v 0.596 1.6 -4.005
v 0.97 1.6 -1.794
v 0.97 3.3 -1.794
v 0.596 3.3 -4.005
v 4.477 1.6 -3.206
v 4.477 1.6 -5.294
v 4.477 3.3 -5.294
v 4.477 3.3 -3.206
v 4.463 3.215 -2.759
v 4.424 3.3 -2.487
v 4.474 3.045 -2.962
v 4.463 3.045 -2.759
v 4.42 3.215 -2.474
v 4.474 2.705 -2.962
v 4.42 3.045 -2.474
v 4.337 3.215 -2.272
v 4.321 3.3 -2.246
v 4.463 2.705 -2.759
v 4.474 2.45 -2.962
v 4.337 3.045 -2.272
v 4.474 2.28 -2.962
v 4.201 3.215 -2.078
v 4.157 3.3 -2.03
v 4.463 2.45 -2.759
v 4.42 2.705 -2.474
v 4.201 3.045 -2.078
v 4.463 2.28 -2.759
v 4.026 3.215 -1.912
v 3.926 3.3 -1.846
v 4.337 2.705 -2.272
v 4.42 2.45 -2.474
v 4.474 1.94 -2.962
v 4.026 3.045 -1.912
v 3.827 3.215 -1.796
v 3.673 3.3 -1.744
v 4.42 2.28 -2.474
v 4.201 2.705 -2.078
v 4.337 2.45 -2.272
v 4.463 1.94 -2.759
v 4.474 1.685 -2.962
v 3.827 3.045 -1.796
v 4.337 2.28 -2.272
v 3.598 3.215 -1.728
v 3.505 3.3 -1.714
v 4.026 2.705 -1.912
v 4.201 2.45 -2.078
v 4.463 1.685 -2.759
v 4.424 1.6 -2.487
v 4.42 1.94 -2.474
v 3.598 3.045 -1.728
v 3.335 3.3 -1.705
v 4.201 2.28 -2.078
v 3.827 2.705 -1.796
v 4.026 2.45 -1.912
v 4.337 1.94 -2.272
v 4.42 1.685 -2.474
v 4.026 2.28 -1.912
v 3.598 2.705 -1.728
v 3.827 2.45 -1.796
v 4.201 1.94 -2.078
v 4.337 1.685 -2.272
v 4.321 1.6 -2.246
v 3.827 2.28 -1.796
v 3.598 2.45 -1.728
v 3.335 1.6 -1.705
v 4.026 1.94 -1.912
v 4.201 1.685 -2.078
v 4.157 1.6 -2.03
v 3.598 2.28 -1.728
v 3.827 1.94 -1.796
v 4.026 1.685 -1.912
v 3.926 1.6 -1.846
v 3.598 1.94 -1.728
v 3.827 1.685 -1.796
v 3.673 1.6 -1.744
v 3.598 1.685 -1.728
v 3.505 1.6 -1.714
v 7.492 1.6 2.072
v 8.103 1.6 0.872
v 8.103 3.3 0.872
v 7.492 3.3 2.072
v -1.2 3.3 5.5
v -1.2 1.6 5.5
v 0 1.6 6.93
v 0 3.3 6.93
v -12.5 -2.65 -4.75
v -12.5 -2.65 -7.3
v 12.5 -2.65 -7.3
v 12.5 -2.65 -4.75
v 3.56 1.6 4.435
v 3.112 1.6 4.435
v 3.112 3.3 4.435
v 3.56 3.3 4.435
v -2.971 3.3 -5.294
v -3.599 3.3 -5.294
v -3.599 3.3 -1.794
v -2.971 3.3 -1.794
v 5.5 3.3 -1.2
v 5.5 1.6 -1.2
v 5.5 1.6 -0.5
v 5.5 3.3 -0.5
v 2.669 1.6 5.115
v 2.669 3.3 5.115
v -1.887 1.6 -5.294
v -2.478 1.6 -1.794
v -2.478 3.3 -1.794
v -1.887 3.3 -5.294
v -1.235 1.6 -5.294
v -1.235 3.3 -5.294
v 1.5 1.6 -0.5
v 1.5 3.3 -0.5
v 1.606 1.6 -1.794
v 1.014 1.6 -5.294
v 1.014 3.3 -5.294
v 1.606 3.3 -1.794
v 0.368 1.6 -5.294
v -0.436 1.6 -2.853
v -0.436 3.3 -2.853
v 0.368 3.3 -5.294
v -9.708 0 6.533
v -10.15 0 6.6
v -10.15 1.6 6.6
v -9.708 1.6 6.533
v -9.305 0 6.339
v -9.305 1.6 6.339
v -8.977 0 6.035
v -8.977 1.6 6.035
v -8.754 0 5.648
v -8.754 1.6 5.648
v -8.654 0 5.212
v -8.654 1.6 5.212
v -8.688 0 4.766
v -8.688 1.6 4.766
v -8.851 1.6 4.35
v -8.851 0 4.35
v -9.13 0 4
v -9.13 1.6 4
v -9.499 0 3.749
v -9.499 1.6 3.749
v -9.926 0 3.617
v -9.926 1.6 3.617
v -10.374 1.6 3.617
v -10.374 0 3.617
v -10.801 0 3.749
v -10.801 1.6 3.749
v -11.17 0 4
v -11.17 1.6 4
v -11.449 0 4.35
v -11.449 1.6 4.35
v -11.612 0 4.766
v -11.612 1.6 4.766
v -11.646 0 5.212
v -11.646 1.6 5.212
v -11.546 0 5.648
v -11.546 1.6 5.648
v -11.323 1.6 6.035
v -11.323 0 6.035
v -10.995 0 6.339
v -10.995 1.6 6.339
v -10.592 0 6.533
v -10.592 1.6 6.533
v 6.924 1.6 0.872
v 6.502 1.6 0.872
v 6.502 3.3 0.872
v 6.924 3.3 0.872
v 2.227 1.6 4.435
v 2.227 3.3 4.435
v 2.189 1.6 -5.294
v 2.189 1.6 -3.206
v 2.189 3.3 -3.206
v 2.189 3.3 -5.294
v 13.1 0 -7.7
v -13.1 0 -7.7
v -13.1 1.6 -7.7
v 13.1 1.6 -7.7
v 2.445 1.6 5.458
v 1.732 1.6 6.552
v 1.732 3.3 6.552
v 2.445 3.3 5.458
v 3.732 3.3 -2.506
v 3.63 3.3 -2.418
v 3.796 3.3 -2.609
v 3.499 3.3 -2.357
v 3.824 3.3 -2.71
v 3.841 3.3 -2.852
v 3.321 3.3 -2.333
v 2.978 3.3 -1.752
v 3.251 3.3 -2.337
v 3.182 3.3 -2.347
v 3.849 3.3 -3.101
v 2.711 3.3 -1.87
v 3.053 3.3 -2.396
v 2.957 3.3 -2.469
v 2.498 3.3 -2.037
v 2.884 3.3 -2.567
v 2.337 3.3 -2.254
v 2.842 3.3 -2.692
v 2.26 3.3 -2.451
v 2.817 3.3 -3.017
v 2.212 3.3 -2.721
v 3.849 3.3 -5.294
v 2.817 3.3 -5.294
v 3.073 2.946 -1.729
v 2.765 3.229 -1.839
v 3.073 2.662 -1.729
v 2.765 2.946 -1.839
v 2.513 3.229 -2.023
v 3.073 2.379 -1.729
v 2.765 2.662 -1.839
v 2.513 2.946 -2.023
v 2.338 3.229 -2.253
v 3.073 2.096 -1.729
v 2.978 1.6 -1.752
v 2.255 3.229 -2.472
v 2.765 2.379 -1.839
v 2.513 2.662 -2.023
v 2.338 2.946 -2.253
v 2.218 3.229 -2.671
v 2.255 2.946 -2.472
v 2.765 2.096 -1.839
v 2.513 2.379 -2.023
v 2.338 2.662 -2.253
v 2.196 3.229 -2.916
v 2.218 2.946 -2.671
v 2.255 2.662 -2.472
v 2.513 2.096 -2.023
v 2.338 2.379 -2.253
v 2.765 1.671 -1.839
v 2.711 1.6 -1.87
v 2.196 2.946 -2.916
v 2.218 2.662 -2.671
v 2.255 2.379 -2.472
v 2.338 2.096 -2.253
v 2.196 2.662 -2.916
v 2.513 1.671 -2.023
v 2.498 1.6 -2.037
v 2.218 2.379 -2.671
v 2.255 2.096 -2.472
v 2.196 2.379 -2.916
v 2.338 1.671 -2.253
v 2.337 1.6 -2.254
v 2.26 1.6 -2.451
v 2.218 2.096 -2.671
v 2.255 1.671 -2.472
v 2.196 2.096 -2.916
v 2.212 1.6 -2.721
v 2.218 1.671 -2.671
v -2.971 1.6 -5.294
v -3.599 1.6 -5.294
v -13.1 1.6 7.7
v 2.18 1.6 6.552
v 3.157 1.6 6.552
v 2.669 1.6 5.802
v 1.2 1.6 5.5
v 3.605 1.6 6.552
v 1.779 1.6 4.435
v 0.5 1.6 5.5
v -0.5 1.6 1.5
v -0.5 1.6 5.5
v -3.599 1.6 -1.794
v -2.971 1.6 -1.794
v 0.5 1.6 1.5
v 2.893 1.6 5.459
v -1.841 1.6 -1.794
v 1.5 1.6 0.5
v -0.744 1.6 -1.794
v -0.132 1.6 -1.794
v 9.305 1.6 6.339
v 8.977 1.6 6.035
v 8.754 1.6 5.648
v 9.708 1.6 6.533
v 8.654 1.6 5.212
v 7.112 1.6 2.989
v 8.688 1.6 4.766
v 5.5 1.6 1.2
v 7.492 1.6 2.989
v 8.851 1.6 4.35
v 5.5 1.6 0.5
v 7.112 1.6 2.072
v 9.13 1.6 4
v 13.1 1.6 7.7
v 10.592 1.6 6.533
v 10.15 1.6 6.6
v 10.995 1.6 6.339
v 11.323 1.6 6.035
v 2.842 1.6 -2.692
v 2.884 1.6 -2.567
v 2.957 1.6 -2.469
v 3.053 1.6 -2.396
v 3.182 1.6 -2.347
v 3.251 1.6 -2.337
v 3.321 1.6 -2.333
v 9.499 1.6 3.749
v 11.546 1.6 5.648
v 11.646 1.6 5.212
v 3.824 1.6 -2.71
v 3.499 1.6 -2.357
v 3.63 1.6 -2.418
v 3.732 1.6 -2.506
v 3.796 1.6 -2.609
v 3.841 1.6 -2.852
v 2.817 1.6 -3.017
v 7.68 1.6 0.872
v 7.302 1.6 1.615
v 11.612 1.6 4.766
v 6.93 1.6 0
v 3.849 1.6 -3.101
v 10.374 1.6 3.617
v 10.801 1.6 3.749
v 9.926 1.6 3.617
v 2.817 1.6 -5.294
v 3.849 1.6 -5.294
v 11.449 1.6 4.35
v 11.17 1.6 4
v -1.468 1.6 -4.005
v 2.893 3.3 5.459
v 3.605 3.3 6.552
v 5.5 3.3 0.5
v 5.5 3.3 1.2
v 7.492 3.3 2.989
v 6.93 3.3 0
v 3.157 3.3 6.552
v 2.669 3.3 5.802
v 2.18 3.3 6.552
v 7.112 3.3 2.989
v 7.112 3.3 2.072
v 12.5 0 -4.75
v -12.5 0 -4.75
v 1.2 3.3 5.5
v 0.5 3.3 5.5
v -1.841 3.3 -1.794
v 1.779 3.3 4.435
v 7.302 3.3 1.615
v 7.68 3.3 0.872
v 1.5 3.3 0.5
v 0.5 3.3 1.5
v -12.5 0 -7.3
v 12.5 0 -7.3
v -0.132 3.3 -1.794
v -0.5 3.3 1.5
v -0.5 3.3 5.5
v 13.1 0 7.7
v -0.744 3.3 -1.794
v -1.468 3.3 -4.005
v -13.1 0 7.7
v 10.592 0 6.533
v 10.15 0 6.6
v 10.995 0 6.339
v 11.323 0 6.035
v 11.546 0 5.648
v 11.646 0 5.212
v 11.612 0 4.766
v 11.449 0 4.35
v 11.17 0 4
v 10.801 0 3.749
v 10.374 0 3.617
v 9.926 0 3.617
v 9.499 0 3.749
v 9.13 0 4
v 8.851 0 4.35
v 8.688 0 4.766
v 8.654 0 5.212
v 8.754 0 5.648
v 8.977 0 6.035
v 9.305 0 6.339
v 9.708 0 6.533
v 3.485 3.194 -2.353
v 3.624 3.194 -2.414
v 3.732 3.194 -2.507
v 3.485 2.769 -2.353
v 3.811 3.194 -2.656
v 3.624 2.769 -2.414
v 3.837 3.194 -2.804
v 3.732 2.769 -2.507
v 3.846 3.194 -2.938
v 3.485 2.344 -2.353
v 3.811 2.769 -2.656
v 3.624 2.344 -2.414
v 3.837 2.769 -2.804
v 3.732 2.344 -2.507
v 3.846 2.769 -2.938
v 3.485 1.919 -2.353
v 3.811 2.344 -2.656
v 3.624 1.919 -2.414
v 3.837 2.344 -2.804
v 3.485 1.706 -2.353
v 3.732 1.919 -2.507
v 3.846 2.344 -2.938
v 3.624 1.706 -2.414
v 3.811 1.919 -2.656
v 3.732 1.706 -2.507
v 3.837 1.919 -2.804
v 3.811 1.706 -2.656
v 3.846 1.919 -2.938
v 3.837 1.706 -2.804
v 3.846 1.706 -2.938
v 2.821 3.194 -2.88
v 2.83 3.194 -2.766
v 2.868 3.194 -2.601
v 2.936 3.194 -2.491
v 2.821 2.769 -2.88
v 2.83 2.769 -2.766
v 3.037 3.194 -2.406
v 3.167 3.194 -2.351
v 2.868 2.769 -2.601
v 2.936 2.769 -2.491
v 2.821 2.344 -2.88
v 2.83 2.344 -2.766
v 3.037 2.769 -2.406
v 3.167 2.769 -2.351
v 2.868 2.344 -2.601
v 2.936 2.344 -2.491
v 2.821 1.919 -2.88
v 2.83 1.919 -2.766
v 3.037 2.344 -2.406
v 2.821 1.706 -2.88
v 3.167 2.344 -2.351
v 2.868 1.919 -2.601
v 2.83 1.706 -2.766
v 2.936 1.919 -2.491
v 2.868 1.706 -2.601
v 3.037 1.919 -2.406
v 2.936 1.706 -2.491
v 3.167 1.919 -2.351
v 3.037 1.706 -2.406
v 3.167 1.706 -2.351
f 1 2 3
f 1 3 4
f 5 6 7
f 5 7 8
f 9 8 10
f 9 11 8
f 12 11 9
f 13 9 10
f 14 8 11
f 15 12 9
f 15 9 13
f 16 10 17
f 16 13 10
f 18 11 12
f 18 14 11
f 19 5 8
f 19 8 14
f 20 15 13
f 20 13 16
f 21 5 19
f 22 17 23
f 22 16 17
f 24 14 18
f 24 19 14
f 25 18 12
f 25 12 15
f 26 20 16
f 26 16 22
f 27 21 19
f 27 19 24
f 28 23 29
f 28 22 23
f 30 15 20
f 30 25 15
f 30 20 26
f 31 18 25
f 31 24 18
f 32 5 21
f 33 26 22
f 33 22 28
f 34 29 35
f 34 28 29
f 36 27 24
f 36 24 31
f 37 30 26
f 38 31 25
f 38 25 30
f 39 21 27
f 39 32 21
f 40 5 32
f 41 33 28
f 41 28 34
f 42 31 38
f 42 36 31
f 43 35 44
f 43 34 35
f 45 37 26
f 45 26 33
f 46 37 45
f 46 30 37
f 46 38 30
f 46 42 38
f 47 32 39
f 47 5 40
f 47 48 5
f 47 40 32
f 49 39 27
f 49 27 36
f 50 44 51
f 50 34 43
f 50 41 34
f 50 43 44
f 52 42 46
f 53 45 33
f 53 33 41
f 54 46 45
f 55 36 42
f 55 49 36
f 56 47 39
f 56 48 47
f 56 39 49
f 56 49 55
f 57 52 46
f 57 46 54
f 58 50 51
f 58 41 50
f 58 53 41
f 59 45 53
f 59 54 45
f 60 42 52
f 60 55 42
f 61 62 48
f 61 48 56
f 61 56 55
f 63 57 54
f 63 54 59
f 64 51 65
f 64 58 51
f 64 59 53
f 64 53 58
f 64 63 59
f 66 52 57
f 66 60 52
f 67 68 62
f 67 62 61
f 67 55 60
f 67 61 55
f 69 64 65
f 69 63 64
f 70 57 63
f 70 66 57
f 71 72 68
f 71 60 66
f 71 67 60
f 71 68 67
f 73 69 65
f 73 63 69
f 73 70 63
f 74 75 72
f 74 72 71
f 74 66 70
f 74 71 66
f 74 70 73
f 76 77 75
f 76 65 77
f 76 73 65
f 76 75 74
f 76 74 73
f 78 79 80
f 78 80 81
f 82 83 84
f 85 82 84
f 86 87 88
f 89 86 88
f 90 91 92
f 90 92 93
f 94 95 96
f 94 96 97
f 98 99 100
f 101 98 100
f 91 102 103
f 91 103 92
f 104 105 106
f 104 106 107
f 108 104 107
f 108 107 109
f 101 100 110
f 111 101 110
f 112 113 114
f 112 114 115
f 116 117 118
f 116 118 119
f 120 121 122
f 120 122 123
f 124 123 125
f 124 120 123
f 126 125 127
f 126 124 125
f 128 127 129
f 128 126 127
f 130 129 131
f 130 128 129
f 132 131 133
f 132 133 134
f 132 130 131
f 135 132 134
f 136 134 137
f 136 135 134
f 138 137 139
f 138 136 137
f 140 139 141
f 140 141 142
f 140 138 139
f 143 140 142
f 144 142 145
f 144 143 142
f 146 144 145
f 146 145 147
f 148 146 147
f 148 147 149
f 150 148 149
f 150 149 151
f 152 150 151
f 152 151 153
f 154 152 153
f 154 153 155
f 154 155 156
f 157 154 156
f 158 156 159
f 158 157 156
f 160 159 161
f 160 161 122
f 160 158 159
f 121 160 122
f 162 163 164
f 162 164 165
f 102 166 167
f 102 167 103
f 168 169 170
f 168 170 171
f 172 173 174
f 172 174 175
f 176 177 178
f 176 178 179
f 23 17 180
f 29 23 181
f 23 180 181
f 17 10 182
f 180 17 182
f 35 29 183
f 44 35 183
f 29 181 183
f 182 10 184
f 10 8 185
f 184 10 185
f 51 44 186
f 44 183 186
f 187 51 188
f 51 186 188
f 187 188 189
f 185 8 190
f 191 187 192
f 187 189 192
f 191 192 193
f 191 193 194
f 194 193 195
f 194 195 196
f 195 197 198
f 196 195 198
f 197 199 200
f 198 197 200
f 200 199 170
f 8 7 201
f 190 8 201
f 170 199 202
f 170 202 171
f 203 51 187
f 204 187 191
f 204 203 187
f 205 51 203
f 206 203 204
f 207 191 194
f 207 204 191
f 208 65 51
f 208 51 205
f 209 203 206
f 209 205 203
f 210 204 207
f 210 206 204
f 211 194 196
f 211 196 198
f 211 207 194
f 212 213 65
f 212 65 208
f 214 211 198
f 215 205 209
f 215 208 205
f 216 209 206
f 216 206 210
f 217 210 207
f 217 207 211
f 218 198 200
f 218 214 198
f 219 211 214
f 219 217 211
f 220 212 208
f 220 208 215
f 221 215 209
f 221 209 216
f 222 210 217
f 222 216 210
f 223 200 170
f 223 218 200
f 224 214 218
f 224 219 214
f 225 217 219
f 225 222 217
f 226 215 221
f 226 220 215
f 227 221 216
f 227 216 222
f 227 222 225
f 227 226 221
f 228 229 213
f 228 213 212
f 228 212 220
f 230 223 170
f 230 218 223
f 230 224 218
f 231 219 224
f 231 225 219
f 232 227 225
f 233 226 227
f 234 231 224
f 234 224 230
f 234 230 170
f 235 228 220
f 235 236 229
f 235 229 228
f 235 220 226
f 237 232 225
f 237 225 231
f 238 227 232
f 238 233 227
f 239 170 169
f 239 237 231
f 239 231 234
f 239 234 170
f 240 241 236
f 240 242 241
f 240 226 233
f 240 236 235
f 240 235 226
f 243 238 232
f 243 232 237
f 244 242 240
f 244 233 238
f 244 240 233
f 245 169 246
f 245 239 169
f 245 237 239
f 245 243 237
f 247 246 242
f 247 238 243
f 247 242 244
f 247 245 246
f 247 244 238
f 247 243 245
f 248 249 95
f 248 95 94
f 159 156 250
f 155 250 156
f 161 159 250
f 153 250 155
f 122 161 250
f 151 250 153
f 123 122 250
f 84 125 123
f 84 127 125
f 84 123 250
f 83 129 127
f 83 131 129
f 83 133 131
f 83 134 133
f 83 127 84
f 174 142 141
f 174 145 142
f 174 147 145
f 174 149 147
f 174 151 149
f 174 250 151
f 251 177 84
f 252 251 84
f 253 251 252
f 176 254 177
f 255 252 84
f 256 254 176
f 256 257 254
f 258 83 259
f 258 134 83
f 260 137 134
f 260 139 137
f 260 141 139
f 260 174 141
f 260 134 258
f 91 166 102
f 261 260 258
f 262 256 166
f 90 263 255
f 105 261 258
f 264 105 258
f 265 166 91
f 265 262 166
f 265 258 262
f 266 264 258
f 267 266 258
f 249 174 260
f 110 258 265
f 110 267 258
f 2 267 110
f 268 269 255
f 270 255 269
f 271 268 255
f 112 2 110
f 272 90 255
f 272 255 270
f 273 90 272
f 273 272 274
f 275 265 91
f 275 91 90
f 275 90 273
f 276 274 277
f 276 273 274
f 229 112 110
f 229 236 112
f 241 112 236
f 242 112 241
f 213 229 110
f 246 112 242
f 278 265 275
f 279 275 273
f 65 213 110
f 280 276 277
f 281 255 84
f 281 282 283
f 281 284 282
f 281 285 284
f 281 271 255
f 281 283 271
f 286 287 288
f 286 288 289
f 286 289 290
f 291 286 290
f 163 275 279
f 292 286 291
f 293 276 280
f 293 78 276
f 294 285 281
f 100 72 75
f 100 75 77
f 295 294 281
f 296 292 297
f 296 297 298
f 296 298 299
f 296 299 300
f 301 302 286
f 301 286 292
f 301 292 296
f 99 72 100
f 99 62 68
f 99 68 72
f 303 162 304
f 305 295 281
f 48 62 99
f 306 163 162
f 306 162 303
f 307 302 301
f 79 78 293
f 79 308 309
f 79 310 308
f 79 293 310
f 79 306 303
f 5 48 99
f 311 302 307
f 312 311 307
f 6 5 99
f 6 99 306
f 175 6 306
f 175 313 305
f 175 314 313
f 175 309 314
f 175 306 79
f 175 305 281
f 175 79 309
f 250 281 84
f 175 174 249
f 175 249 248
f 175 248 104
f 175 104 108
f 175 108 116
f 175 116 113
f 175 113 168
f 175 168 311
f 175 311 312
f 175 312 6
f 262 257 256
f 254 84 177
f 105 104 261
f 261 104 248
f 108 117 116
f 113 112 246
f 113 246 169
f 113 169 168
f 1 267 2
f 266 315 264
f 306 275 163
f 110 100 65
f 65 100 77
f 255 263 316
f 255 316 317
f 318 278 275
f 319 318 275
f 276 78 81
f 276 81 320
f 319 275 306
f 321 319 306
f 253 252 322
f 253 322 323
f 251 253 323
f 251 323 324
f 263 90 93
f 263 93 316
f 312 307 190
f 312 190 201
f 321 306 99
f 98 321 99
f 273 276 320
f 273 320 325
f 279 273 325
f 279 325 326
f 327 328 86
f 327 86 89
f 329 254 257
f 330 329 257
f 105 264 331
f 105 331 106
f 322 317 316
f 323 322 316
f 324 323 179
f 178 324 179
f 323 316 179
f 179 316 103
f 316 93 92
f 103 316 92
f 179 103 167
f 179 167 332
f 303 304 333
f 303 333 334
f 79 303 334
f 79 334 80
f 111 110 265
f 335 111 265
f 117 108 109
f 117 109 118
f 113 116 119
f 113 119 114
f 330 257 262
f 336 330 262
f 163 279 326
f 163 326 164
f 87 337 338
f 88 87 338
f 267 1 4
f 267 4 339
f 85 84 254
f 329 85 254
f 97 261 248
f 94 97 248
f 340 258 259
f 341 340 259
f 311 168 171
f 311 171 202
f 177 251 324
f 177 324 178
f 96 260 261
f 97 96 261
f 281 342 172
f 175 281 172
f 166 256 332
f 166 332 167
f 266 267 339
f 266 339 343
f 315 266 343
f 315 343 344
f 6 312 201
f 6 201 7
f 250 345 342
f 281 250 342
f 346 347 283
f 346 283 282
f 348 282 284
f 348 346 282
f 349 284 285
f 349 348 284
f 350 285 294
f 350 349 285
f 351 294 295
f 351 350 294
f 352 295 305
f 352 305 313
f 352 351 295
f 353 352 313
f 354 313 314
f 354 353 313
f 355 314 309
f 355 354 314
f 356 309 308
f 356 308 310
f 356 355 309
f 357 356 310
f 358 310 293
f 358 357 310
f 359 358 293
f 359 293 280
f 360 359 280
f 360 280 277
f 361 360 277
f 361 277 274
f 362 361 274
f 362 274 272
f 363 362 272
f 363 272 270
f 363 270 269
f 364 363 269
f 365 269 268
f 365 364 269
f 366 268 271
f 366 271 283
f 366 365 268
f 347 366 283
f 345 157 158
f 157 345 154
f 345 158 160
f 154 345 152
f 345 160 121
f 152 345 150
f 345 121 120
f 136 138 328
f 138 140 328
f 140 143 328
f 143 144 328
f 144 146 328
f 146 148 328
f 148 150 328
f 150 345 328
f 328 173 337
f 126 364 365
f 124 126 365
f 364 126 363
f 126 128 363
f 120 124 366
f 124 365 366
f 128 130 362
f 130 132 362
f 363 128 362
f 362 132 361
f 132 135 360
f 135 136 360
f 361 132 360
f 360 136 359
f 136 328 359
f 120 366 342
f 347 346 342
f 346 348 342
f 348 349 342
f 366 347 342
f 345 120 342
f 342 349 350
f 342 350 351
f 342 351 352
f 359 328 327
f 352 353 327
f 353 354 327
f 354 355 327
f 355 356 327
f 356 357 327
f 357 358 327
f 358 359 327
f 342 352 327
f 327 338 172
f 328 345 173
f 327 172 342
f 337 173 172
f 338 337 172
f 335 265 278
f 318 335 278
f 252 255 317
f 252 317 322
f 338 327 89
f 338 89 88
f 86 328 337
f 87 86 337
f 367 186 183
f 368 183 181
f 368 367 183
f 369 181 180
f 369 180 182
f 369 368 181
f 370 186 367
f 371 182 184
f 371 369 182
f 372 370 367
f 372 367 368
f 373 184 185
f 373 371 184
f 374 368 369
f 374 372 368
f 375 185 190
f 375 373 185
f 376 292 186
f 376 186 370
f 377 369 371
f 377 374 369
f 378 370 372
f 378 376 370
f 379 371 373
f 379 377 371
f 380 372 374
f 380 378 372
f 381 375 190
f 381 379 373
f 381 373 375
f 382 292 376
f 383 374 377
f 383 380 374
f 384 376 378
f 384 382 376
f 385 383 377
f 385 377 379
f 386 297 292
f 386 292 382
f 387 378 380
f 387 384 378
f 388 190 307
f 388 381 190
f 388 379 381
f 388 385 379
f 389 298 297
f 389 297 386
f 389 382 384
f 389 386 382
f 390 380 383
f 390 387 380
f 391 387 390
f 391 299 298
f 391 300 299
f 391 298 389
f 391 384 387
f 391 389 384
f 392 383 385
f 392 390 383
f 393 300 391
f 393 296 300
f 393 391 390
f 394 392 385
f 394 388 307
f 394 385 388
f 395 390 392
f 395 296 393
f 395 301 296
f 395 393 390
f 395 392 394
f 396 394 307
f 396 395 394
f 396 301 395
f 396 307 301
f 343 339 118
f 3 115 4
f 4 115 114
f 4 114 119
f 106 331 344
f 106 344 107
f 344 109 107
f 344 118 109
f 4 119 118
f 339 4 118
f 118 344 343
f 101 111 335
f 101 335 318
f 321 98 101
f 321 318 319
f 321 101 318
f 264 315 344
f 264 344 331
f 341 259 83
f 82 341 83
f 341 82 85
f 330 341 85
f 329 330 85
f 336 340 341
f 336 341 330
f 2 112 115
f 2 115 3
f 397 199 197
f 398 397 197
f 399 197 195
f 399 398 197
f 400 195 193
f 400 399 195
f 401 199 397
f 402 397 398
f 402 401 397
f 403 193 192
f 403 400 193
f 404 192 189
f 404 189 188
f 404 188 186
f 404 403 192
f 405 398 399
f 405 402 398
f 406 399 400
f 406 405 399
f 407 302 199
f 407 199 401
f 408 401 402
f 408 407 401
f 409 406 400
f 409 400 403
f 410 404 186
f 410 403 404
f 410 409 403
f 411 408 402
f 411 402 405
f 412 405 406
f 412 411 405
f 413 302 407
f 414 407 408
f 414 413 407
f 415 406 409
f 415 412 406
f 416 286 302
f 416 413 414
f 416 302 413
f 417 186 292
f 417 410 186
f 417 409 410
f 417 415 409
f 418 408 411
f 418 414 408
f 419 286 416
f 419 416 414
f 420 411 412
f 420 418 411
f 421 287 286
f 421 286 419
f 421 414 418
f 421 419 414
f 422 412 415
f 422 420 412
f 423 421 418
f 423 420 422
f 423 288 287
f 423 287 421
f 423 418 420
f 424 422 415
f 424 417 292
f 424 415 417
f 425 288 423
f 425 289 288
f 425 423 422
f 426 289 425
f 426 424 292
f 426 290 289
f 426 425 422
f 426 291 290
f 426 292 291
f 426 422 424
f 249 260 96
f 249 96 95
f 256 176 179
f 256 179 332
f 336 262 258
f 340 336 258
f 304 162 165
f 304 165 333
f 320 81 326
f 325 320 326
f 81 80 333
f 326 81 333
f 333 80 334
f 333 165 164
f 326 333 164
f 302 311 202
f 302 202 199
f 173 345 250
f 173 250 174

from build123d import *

# Parameters (mm, degrees)
SKETCH_1_W      = 26.2
SKETCH_1_H      = 15.4
SKETCH_1_R      = 1.5
EXTRUDE_1_DEPTH = 1.6
SKETCH_1_3_W    = 25
SKETCH_1_3_H    = 2.55
EXTRUDE_2_DEPTH = 2.65
SKETCH_2_W      = 0.628205128
SKETCH_2_H      = 3.5
EXTRUDE_3_DEPTH = 1.7


with BuildPart() as part:
    # 스케치1 → 보스-돌출1 (new body)
    with BuildSketch(Plane(origin=(0, 0, 0), x_dir=(1, 0, 0), z_dir=(0, 1, 0))):
        Rectangle(SKETCH_1_W, SKETCH_1_H)
        with Locations((-10.15, -5.1)):
            Circle(SKETCH_1_R, mode=Mode.SUBTRACT)
        with Locations((10.15, -5.1)):
            Circle(SKETCH_1_R, mode=Mode.SUBTRACT)
    extrude(amount=EXTRUDE_1_DEPTH)

    # 스케치1<3> → 보스-돌출2 (add)
    with BuildSketch(Plane(origin=(0, 0, 0), x_dir=(1, 0, 0), z_dir=(0, 1, 0))):
        with Locations((0, 6.025)):
            Rectangle(SKETCH_1_3_W, SKETCH_1_3_H)
    extrude(amount=-EXTRUDE_2_DEPTH)

    # 스케치2 → 보스-돌출3 (add)
    with BuildSketch(Plane(origin=(0, 1.6, 0), x_dir=(1, 0, 0), z_dir=(0, 1, 0))):
        Polygon((0.5, -1.5), (-0.5, -1.5), (-0.5, -5.5), (-1.2, -5.5), (0, -6.930104311), (1.2, -5.5), (0.5, -5.5), align=None)
        Polygon((5.5, -1.2), (6.930104311, 0), (5.5, 1.2), (5.5, 0.5), (1.5, 0.5), (1.5, -0.5), (5.5, -0.5), align=None)
        with Locations((-3.28532471, 3.544331345)):
            Rectangle(SKETCH_2_W, SKETCH_2_H)
        Polygon((-1.886586729, 5.294331345), (-1.23454346, 5.294331345), (-0.435965736, 2.853025255), (0.368220963, 5.294331345), (1.013954136, 5.294331345), (1.605700931, 1.794331345), (0.969783463, 1.794331345), (0.596085547, 4.004968364), (-0.131678877, 1.794331345), (-0.744459325, 1.794331345), (-1.468017018, 4.004968364), (-1.841013812, 1.794331345), (-2.477632402, 1.794331345), align=None)
        with BuildLine():
            Line((2.189034264, 5.294331345), (2.817239393, 5.294331345))
            Line((2.817239393, 5.294331345), (2.817239393, 3.017087755))
            add(Edge.make_bspline(
                [(2.817239393, 3.017087755), (2.817273551, 2.993478281), (2.817339529, 2.947876826), (2.82064238, 2.882453669), (2.823664717, 2.822316089), (2.82911787, 2.767529925), (2.837174047, 2.71807174), (2.844975055, 2.673623833), (2.855532948, 2.634981994), (2.871399773, 2.590997464), (2.895845342, 2.541578443), (2.935788046, 2.490072805), (2.981878508, 2.443066435), (3.037120582, 2.403940113), (3.099207788, 2.372290446), (3.167798984, 2.348841544), (3.242797481, 2.335807069), (3.294654828, 2.333817117), (3.321345963, 2.332792883)],
                knots=[0, 0, 0, 0, 1.155499968, 2.231836252, 3.205919964, 4.102923608, 4.924856345, 5.658536265, 6.31071849, 6.882491295, 7.94666036, 8.992281882, 10.060072772, 11.158554251, 12.289267114, 13.461410017, 14.693379945, 16, 16, 16, 16], degree=3))
            add(Edge.make_bspline(
                [(3.321345963, 2.332792883), (3.349702001, 2.333620333), (3.404991473, 2.33523372), (3.484516578, 2.351070858), (3.558197038, 2.376289005), (3.624472787, 2.412281729), (3.68327787, 2.455425316), (3.733055141, 2.504622525), (3.772339181, 2.55997148), (3.797943056, 2.611035105), (3.812318371, 2.658034726), (3.823093386, 2.700027104), (3.830992664, 2.749573953), (3.838159148, 2.805901493), (3.842465653, 2.869593167), (3.847135356, 2.940136761), (3.848846846, 3.018014951), (3.849138556, 3.072242996), (3.849290675, 3.100521249)],
                knots=[0, 0, 0, 0, 1.261321664, 2.459363699, 3.594844139, 4.716940403, 5.803436589, 6.833651888, 7.818396249, 8.814403945, 9.360733334, 10.004355033, 10.743453831, 11.592799886, 12.532235708, 13.585170094, 14.740740724, 16, 16, 16, 16], degree=3))
            Line((3.849290675, 3.100521249), (3.849290675, 5.294331345))
            Line((3.849290675, 5.294331345), (4.477495803, 5.294331345))
            Line((4.477495803, 5.294331345), (4.477495803, 3.20639064))
            add(Edge.make_bspline(
                [(4.477495803, 3.20639064), (4.477408565, 3.164089061), (4.477240816, 3.08274725), (4.474664688, 2.965853344), (4.469180577, 2.859089511), (4.464574557, 2.762424556), (4.455660331, 2.675988702), (4.446373798, 2.599412843), (4.434537313, 2.532968347), (4.416925335, 2.457329363), (4.386532275, 2.370233842), (4.337534678, 2.269947127), (4.275335399, 2.171760357), (4.201818961, 2.076753656), (4.118812177, 1.988495493), (4.028155486, 1.91101625), (3.931289197, 1.845477164), (3.827201127, 1.793480747), (3.71597986, 1.752927462), (3.596524945, 1.725677696), (3.46891784, 1.707267413), (3.380777201, 1.705498879), (3.335368399, 1.704587755)],
                knots=[0, 0, 0, 0, 1.170808336, 2.251350247, 3.235597562, 4.129743112, 4.929140599, 5.639994148, 6.264258765, 6.79612947, 7.788252245, 8.809469599, 9.879094798, 10.999557536, 12.129761673, 13.226370002, 14.293821979, 15.358369427, 16.438775801, 17.562147481, 18.744053101, 20, 20, 20, 20], degree=3))
            add(Edge.make_bspline(
                [(3.335368399, 1.704587755), (3.305197888, 1.705095937), (3.245672088, 1.706098571), (3.158128956, 1.714939179), (3.073501323, 1.727966912), (2.991948202, 1.746973032), (2.913186538, 1.771525389), (2.837237257, 1.801747631), (2.764382604, 1.837471182), (2.695030264, 1.878367463), (2.62926558, 1.92258975), (2.569160054, 1.971612016), (2.512645313, 2.021808881), (2.461354044, 2.075292841), (2.414901005, 2.131502406), (2.373381866, 2.190564964), (2.33685831, 2.252475271), (2.304411607, 2.318349254), (2.276640395, 2.391535053), (2.253228221, 2.474635914), (2.232774795, 2.568954362), (2.217575015, 2.67470289), (2.203794806, 2.791532964), (2.195072693, 2.919748944), (2.190509763, 3.059354507), (2.189538525, 3.156140151), (2.189034264, 3.20639064)],
                knots=[0, 0, 0, 0, 1.001158378, 1.975264943, 2.917723546, 3.841610987, 4.75185031, 5.653588123, 6.552117133, 7.442167995, 8.324307438, 9.179605724, 10.014504199, 10.831958861, 11.636465792, 12.43274043, 13.225645099, 14.020104002, 14.867201867, 15.819789774, 16.883317127, 18.068162734, 19.364263498, 20.787406516, 22.332041935, 24, 24, 24, 24], degree=3))
            Line((2.189034264, 3.20639064), (2.189034264, 5.294331345))
        make_face()
        Polygon((1.779131112, -4.434974289), (2.226887522, -4.434974289), (2.66913178, -5.114665128), (3.112224061, -4.434974289), (3.560404483, -4.434974289), (2.893009985, -5.458538659), (3.604501705, -6.551640956), (3.156745295, -6.551640956), (2.66913178, -5.801988178), (2.18024623, -6.551640956), (1.732065808, -6.551640956), (2.445253575, -5.458114647), align=None)
        Polygon((6.501577719, -0.872404796), (6.924317436, -0.872404796), (7.302111907, -1.614849374), (7.679906378, -0.872404796), (8.102646095, -0.872404796), (7.492069172, -2.072358055), (7.492069172, -2.989071463), (7.112154642, -2.989071463), (7.112154642, -2.072358055), align=None)
    extrude(amount=EXTRUDE_3_DEPTH)


solid = part.part
